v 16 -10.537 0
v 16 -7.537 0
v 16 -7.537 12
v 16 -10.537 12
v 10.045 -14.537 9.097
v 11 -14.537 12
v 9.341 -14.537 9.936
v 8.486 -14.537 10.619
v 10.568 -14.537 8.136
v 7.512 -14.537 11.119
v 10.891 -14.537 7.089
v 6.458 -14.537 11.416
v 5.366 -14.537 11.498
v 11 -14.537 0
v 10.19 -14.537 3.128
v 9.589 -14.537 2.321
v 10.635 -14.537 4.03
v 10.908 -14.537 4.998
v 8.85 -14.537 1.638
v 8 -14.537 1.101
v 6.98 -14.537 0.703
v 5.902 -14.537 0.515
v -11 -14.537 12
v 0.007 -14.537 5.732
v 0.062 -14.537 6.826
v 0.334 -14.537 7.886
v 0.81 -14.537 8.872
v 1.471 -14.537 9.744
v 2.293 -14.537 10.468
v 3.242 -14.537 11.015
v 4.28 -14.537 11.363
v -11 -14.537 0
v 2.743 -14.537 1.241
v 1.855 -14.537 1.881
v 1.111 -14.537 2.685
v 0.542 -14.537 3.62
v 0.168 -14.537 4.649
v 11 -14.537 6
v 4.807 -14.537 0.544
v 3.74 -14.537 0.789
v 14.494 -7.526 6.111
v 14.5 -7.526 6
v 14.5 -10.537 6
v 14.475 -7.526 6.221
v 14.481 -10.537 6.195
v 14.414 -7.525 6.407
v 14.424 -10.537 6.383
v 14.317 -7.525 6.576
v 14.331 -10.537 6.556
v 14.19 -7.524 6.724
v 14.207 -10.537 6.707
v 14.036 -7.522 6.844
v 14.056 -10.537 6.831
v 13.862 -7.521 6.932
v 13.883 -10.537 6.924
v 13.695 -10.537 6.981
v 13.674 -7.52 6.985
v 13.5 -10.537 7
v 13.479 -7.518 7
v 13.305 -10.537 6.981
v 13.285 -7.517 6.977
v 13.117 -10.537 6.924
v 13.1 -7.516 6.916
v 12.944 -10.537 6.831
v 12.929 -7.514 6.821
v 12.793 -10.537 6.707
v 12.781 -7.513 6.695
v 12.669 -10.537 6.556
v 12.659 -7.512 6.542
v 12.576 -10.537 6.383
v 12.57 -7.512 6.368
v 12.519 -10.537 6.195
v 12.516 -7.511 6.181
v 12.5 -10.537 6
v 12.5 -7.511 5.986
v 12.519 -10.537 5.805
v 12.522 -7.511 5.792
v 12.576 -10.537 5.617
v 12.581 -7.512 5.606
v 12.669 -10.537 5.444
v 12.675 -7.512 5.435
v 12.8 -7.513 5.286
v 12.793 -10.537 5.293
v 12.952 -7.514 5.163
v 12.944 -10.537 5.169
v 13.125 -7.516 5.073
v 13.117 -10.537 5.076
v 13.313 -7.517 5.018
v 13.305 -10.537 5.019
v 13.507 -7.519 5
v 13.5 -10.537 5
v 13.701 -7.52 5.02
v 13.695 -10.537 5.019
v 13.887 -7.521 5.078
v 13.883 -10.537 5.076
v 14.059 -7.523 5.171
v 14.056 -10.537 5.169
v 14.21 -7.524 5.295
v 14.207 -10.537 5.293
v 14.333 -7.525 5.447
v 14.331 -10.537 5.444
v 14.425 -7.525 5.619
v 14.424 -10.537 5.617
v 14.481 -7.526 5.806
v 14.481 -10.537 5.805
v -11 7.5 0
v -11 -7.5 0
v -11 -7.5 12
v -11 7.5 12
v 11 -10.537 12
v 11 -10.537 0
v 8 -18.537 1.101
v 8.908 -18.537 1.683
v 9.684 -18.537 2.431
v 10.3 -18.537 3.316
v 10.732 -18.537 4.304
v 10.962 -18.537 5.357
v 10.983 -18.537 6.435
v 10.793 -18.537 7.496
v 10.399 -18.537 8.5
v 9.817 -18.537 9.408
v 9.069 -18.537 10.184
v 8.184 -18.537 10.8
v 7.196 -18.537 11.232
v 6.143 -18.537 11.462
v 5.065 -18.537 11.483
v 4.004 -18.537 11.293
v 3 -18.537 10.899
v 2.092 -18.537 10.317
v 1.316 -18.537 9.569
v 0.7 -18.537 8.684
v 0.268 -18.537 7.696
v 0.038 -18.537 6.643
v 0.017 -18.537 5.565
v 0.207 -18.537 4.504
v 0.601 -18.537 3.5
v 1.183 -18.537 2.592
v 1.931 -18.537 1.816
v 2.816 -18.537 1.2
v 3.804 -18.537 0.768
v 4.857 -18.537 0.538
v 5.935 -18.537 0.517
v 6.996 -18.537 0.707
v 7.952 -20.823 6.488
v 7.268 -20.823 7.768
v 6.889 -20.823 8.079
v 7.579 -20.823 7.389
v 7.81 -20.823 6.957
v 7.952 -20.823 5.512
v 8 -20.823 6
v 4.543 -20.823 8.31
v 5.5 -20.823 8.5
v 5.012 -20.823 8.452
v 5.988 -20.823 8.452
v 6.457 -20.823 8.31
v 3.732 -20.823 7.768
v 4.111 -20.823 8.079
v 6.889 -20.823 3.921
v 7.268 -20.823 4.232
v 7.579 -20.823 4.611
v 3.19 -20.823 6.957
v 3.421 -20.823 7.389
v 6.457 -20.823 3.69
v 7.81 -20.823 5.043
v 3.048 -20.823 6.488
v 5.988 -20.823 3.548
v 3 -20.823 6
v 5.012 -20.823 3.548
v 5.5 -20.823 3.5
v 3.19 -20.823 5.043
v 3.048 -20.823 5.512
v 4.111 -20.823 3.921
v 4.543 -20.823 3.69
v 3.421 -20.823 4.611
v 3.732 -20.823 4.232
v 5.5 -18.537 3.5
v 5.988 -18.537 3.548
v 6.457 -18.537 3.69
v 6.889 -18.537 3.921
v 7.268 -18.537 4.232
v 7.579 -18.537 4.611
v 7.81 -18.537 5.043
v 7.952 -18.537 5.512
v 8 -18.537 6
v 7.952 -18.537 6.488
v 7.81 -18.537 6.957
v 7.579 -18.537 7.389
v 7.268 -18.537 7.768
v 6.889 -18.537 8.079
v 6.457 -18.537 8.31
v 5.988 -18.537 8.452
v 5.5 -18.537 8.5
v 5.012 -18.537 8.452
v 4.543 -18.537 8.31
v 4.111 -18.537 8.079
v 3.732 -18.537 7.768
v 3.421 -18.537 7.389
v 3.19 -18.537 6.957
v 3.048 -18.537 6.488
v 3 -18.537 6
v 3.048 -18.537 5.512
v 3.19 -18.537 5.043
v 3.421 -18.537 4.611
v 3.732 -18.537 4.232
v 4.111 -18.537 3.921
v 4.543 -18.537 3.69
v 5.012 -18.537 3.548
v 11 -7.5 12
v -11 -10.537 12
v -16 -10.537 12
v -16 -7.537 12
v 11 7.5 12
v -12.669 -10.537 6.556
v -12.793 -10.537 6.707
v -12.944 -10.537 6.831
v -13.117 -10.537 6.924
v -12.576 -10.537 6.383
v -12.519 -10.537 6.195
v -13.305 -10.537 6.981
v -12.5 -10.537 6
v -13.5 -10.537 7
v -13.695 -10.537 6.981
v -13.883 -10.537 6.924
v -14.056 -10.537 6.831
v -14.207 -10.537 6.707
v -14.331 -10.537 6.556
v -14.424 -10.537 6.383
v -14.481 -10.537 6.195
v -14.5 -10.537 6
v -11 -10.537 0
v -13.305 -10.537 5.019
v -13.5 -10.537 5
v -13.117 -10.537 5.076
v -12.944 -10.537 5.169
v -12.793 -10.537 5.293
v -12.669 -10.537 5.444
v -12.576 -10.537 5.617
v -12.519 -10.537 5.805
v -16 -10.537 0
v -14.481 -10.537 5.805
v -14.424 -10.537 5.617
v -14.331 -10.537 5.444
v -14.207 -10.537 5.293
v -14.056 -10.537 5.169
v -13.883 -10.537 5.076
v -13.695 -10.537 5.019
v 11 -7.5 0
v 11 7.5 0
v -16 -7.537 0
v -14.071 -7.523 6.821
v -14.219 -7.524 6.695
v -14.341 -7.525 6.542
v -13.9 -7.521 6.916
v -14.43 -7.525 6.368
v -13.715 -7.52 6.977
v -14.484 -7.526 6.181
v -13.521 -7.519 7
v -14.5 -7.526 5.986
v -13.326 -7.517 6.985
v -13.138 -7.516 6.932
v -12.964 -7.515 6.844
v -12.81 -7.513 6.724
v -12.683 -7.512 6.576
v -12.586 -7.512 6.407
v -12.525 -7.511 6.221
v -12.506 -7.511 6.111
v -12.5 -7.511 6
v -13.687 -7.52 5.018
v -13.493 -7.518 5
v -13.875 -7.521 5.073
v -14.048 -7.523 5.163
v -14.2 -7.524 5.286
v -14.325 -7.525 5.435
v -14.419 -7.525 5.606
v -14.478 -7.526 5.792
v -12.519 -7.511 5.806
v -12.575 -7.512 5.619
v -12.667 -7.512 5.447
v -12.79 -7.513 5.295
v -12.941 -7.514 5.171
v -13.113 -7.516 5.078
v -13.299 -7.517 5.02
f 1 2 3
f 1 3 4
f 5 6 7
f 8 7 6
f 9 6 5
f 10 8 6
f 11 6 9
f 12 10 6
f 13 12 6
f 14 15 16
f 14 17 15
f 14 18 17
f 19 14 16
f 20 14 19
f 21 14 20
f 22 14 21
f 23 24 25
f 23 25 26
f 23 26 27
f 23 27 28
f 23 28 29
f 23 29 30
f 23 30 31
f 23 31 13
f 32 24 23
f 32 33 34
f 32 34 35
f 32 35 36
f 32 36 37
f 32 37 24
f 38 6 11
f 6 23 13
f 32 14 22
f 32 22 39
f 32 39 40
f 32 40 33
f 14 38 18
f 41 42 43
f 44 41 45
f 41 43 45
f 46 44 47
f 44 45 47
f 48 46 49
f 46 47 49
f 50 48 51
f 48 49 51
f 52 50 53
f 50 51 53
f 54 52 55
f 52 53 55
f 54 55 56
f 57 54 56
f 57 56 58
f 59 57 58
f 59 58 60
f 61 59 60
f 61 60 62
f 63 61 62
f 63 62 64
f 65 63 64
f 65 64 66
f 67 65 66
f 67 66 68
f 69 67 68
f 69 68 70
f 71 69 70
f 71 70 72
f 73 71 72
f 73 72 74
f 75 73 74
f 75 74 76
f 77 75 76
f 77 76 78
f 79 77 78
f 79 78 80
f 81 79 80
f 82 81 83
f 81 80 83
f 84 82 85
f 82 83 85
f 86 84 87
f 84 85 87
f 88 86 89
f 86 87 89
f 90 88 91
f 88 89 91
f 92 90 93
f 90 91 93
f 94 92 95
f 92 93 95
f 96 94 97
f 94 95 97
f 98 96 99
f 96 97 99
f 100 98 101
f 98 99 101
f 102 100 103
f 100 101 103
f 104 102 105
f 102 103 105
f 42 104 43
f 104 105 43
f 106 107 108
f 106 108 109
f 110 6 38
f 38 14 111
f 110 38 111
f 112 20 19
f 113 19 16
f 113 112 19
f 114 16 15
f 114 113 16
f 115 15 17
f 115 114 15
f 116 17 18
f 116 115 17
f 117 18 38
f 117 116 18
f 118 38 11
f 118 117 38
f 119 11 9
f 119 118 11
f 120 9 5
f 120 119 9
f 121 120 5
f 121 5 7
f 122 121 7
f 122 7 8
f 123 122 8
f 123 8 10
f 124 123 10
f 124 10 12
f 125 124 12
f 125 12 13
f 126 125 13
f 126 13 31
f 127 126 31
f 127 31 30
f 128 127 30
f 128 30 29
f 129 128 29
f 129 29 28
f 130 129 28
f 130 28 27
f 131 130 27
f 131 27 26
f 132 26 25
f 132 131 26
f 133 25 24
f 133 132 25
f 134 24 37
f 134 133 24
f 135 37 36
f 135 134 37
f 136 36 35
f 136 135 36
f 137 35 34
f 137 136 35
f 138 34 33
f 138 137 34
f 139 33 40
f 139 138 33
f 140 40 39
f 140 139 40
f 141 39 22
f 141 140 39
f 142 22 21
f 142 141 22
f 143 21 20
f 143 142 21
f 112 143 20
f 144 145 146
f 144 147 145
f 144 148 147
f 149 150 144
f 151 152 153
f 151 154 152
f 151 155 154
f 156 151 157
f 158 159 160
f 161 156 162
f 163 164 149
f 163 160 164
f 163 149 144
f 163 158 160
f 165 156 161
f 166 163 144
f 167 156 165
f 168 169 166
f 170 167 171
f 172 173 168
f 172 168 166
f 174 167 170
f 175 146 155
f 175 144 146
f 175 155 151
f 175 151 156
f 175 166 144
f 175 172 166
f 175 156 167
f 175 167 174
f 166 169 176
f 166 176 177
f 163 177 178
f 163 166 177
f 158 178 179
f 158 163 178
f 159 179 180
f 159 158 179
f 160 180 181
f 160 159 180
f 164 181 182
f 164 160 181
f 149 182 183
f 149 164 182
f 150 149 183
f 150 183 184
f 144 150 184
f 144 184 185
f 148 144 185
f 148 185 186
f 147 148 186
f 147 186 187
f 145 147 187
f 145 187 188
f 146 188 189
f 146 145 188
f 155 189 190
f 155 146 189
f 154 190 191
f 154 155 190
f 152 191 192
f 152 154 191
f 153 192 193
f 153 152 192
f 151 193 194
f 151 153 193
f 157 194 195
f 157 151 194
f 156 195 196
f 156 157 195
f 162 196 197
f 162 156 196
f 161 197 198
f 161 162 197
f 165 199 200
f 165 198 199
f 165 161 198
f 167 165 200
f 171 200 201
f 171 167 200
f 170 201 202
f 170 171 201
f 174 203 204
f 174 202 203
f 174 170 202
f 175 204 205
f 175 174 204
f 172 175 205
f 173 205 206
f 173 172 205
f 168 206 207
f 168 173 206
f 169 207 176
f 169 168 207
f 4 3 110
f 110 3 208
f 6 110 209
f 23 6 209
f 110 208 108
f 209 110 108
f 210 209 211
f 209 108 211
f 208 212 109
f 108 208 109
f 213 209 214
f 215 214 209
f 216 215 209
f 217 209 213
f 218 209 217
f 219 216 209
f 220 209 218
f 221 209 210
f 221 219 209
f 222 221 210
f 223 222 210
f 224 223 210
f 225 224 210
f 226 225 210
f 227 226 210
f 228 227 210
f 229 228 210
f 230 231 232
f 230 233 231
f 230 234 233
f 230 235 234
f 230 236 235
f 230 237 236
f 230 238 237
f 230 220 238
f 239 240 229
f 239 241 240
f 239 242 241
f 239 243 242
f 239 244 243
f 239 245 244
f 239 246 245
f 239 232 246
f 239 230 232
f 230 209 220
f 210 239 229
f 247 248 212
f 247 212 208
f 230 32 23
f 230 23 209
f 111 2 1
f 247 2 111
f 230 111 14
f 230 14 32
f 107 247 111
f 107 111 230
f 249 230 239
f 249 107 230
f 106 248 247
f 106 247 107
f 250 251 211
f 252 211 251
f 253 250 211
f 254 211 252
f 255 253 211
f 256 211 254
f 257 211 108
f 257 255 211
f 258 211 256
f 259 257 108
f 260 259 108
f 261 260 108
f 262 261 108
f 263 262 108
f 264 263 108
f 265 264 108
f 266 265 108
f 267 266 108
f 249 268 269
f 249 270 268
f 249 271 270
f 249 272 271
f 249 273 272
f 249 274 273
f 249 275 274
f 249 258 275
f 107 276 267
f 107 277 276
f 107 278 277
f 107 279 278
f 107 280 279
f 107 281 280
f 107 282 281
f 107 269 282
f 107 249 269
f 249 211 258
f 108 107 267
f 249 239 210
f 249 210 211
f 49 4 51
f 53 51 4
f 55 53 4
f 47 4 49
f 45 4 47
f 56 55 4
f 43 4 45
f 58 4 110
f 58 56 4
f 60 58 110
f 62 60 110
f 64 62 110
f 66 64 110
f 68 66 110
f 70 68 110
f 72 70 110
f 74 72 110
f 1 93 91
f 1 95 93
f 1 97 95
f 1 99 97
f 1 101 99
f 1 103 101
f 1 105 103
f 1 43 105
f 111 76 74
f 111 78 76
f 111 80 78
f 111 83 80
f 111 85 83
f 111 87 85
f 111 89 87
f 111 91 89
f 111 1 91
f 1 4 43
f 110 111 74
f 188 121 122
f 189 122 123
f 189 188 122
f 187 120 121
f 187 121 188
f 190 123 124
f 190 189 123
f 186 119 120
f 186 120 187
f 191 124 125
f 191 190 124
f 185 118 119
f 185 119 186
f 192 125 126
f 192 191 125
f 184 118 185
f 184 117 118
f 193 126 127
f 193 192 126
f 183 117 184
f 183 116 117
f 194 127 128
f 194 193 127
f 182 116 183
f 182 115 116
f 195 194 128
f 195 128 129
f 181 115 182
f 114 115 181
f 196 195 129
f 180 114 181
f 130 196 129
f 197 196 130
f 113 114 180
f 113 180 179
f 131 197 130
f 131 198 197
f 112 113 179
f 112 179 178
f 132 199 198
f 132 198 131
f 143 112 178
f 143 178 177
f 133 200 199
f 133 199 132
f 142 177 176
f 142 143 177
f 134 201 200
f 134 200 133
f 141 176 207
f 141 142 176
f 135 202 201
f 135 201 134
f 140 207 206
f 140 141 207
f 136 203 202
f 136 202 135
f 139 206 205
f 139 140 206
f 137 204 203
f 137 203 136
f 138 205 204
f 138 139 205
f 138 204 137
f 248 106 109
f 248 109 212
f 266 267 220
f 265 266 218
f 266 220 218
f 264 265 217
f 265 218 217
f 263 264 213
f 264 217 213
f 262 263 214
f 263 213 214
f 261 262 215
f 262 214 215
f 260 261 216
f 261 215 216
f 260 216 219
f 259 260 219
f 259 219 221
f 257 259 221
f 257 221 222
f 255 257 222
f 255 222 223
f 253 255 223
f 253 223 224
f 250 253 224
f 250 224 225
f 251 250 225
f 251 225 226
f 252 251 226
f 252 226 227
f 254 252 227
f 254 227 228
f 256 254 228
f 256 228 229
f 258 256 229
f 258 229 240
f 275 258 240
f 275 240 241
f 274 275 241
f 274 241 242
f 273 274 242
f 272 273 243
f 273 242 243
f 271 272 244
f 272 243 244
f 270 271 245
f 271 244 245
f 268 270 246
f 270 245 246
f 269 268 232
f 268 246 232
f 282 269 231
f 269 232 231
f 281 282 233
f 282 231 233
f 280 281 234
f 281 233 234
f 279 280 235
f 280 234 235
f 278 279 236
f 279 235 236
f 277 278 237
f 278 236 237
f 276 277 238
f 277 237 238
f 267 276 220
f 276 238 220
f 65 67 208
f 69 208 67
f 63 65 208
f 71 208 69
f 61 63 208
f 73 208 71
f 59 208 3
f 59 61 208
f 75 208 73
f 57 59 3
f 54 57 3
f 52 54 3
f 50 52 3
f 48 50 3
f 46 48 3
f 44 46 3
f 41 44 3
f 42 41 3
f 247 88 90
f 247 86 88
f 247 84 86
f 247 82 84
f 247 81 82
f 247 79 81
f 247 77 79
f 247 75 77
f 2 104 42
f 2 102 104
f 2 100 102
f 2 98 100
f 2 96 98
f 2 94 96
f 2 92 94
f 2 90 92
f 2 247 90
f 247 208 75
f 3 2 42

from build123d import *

# Parameters (mm, degrees)
SALIENTE_EXTRUIR1_DEPTH = 12
CROQUIS2_OUTSIDE_W      = 42.878
CROQUIS2_OUTSIDE_H      = 22.878
CROQUIS2_OUTSIDE_R      = 5.5
CORTAR_EXTRUIR1_DEPTH   = 6.285514833
CROQUIS3_OUTSIDE_W      = 42.878
CROQUIS3_OUTSIDE_H      = 22.878
CROQUIS3_OUTSIDE_R      = 2.5
CORTAR_EXTRUIR2_DEPTH   = 2.285514833
CROQUIS4_R              = 1
CORTAR_EXTRUIR3_DEPTH   = 12


with BuildPart() as part:
    # Croquis1 → Saliente-Extruir1 (new body)
    with BuildSketch(Plane.XY):
        Polygon((-16, -7.537010796), (-11, -7.5), (-11, 7.5), (11, 7.5), (11, -7.5), (16, -7.537010796), (16, -10.537010796), (11, -10.537010796), (11, -14.537010796), (11, -18.537010796), (8, -18.537010796), (8, -20.822525629), (3, -20.822525629), (3, -18.537010796), (0, -18.537010796), (0, -14.537010796), (-11, -14.537010796), (-11, -10.537010796), (-16, -10.537010796), align=None)
    extrude(amount=SALIENTE_EXTRUIR1_DEPTH)

    # Croquis2 outside → Cortar-Extruir1 (cut)
    with BuildSketch(Plane.XZ.offset(20.822525629)):
        with Locations((0, 6)):
            Rectangle(CROQUIS2_OUTSIDE_W, CROQUIS2_OUTSIDE_H)
        with Locations(Location((5.5, 6, 0), (0, 0, 297.035691789))):
            Circle(CROQUIS2_OUTSIDE_R, mode=Mode.SUBTRACT)
    extrude(amount=-CORTAR_EXTRUIR1_DEPTH, mode=Mode.SUBTRACT)

    # Croquis3 outside → Cortar-Extruir2 (cut)
    with BuildSketch(Plane.XZ.offset(20.822525629)):
        with Locations((0, 6)):
            Rectangle(CROQUIS3_OUTSIDE_W, CROQUIS3_OUTSIDE_H)
        with Locations(Location((5.5, 6, 0), (0, 0, 270))):
            Circle(CROQUIS3_OUTSIDE_R, mode=Mode.SUBTRACT)
    extrude(amount=-CORTAR_EXTRUIR2_DEPTH, mode=Mode.SUBTRACT)

    # Croquis4 → Cortar-Extruir3 (cut)
    with BuildSketch(Plane.XZ.offset(10.537010796)):
        with Locations((-13.5, 6)):
            Circle(CROQUIS4_R)
        with Locations((13.5, 6)):
            Circle(CROQUIS4_R)
    extrude(amount=-CORTAR_EXTRUIR3_DEPTH, mode=Mode.SUBTRACT)


solid = part.part
